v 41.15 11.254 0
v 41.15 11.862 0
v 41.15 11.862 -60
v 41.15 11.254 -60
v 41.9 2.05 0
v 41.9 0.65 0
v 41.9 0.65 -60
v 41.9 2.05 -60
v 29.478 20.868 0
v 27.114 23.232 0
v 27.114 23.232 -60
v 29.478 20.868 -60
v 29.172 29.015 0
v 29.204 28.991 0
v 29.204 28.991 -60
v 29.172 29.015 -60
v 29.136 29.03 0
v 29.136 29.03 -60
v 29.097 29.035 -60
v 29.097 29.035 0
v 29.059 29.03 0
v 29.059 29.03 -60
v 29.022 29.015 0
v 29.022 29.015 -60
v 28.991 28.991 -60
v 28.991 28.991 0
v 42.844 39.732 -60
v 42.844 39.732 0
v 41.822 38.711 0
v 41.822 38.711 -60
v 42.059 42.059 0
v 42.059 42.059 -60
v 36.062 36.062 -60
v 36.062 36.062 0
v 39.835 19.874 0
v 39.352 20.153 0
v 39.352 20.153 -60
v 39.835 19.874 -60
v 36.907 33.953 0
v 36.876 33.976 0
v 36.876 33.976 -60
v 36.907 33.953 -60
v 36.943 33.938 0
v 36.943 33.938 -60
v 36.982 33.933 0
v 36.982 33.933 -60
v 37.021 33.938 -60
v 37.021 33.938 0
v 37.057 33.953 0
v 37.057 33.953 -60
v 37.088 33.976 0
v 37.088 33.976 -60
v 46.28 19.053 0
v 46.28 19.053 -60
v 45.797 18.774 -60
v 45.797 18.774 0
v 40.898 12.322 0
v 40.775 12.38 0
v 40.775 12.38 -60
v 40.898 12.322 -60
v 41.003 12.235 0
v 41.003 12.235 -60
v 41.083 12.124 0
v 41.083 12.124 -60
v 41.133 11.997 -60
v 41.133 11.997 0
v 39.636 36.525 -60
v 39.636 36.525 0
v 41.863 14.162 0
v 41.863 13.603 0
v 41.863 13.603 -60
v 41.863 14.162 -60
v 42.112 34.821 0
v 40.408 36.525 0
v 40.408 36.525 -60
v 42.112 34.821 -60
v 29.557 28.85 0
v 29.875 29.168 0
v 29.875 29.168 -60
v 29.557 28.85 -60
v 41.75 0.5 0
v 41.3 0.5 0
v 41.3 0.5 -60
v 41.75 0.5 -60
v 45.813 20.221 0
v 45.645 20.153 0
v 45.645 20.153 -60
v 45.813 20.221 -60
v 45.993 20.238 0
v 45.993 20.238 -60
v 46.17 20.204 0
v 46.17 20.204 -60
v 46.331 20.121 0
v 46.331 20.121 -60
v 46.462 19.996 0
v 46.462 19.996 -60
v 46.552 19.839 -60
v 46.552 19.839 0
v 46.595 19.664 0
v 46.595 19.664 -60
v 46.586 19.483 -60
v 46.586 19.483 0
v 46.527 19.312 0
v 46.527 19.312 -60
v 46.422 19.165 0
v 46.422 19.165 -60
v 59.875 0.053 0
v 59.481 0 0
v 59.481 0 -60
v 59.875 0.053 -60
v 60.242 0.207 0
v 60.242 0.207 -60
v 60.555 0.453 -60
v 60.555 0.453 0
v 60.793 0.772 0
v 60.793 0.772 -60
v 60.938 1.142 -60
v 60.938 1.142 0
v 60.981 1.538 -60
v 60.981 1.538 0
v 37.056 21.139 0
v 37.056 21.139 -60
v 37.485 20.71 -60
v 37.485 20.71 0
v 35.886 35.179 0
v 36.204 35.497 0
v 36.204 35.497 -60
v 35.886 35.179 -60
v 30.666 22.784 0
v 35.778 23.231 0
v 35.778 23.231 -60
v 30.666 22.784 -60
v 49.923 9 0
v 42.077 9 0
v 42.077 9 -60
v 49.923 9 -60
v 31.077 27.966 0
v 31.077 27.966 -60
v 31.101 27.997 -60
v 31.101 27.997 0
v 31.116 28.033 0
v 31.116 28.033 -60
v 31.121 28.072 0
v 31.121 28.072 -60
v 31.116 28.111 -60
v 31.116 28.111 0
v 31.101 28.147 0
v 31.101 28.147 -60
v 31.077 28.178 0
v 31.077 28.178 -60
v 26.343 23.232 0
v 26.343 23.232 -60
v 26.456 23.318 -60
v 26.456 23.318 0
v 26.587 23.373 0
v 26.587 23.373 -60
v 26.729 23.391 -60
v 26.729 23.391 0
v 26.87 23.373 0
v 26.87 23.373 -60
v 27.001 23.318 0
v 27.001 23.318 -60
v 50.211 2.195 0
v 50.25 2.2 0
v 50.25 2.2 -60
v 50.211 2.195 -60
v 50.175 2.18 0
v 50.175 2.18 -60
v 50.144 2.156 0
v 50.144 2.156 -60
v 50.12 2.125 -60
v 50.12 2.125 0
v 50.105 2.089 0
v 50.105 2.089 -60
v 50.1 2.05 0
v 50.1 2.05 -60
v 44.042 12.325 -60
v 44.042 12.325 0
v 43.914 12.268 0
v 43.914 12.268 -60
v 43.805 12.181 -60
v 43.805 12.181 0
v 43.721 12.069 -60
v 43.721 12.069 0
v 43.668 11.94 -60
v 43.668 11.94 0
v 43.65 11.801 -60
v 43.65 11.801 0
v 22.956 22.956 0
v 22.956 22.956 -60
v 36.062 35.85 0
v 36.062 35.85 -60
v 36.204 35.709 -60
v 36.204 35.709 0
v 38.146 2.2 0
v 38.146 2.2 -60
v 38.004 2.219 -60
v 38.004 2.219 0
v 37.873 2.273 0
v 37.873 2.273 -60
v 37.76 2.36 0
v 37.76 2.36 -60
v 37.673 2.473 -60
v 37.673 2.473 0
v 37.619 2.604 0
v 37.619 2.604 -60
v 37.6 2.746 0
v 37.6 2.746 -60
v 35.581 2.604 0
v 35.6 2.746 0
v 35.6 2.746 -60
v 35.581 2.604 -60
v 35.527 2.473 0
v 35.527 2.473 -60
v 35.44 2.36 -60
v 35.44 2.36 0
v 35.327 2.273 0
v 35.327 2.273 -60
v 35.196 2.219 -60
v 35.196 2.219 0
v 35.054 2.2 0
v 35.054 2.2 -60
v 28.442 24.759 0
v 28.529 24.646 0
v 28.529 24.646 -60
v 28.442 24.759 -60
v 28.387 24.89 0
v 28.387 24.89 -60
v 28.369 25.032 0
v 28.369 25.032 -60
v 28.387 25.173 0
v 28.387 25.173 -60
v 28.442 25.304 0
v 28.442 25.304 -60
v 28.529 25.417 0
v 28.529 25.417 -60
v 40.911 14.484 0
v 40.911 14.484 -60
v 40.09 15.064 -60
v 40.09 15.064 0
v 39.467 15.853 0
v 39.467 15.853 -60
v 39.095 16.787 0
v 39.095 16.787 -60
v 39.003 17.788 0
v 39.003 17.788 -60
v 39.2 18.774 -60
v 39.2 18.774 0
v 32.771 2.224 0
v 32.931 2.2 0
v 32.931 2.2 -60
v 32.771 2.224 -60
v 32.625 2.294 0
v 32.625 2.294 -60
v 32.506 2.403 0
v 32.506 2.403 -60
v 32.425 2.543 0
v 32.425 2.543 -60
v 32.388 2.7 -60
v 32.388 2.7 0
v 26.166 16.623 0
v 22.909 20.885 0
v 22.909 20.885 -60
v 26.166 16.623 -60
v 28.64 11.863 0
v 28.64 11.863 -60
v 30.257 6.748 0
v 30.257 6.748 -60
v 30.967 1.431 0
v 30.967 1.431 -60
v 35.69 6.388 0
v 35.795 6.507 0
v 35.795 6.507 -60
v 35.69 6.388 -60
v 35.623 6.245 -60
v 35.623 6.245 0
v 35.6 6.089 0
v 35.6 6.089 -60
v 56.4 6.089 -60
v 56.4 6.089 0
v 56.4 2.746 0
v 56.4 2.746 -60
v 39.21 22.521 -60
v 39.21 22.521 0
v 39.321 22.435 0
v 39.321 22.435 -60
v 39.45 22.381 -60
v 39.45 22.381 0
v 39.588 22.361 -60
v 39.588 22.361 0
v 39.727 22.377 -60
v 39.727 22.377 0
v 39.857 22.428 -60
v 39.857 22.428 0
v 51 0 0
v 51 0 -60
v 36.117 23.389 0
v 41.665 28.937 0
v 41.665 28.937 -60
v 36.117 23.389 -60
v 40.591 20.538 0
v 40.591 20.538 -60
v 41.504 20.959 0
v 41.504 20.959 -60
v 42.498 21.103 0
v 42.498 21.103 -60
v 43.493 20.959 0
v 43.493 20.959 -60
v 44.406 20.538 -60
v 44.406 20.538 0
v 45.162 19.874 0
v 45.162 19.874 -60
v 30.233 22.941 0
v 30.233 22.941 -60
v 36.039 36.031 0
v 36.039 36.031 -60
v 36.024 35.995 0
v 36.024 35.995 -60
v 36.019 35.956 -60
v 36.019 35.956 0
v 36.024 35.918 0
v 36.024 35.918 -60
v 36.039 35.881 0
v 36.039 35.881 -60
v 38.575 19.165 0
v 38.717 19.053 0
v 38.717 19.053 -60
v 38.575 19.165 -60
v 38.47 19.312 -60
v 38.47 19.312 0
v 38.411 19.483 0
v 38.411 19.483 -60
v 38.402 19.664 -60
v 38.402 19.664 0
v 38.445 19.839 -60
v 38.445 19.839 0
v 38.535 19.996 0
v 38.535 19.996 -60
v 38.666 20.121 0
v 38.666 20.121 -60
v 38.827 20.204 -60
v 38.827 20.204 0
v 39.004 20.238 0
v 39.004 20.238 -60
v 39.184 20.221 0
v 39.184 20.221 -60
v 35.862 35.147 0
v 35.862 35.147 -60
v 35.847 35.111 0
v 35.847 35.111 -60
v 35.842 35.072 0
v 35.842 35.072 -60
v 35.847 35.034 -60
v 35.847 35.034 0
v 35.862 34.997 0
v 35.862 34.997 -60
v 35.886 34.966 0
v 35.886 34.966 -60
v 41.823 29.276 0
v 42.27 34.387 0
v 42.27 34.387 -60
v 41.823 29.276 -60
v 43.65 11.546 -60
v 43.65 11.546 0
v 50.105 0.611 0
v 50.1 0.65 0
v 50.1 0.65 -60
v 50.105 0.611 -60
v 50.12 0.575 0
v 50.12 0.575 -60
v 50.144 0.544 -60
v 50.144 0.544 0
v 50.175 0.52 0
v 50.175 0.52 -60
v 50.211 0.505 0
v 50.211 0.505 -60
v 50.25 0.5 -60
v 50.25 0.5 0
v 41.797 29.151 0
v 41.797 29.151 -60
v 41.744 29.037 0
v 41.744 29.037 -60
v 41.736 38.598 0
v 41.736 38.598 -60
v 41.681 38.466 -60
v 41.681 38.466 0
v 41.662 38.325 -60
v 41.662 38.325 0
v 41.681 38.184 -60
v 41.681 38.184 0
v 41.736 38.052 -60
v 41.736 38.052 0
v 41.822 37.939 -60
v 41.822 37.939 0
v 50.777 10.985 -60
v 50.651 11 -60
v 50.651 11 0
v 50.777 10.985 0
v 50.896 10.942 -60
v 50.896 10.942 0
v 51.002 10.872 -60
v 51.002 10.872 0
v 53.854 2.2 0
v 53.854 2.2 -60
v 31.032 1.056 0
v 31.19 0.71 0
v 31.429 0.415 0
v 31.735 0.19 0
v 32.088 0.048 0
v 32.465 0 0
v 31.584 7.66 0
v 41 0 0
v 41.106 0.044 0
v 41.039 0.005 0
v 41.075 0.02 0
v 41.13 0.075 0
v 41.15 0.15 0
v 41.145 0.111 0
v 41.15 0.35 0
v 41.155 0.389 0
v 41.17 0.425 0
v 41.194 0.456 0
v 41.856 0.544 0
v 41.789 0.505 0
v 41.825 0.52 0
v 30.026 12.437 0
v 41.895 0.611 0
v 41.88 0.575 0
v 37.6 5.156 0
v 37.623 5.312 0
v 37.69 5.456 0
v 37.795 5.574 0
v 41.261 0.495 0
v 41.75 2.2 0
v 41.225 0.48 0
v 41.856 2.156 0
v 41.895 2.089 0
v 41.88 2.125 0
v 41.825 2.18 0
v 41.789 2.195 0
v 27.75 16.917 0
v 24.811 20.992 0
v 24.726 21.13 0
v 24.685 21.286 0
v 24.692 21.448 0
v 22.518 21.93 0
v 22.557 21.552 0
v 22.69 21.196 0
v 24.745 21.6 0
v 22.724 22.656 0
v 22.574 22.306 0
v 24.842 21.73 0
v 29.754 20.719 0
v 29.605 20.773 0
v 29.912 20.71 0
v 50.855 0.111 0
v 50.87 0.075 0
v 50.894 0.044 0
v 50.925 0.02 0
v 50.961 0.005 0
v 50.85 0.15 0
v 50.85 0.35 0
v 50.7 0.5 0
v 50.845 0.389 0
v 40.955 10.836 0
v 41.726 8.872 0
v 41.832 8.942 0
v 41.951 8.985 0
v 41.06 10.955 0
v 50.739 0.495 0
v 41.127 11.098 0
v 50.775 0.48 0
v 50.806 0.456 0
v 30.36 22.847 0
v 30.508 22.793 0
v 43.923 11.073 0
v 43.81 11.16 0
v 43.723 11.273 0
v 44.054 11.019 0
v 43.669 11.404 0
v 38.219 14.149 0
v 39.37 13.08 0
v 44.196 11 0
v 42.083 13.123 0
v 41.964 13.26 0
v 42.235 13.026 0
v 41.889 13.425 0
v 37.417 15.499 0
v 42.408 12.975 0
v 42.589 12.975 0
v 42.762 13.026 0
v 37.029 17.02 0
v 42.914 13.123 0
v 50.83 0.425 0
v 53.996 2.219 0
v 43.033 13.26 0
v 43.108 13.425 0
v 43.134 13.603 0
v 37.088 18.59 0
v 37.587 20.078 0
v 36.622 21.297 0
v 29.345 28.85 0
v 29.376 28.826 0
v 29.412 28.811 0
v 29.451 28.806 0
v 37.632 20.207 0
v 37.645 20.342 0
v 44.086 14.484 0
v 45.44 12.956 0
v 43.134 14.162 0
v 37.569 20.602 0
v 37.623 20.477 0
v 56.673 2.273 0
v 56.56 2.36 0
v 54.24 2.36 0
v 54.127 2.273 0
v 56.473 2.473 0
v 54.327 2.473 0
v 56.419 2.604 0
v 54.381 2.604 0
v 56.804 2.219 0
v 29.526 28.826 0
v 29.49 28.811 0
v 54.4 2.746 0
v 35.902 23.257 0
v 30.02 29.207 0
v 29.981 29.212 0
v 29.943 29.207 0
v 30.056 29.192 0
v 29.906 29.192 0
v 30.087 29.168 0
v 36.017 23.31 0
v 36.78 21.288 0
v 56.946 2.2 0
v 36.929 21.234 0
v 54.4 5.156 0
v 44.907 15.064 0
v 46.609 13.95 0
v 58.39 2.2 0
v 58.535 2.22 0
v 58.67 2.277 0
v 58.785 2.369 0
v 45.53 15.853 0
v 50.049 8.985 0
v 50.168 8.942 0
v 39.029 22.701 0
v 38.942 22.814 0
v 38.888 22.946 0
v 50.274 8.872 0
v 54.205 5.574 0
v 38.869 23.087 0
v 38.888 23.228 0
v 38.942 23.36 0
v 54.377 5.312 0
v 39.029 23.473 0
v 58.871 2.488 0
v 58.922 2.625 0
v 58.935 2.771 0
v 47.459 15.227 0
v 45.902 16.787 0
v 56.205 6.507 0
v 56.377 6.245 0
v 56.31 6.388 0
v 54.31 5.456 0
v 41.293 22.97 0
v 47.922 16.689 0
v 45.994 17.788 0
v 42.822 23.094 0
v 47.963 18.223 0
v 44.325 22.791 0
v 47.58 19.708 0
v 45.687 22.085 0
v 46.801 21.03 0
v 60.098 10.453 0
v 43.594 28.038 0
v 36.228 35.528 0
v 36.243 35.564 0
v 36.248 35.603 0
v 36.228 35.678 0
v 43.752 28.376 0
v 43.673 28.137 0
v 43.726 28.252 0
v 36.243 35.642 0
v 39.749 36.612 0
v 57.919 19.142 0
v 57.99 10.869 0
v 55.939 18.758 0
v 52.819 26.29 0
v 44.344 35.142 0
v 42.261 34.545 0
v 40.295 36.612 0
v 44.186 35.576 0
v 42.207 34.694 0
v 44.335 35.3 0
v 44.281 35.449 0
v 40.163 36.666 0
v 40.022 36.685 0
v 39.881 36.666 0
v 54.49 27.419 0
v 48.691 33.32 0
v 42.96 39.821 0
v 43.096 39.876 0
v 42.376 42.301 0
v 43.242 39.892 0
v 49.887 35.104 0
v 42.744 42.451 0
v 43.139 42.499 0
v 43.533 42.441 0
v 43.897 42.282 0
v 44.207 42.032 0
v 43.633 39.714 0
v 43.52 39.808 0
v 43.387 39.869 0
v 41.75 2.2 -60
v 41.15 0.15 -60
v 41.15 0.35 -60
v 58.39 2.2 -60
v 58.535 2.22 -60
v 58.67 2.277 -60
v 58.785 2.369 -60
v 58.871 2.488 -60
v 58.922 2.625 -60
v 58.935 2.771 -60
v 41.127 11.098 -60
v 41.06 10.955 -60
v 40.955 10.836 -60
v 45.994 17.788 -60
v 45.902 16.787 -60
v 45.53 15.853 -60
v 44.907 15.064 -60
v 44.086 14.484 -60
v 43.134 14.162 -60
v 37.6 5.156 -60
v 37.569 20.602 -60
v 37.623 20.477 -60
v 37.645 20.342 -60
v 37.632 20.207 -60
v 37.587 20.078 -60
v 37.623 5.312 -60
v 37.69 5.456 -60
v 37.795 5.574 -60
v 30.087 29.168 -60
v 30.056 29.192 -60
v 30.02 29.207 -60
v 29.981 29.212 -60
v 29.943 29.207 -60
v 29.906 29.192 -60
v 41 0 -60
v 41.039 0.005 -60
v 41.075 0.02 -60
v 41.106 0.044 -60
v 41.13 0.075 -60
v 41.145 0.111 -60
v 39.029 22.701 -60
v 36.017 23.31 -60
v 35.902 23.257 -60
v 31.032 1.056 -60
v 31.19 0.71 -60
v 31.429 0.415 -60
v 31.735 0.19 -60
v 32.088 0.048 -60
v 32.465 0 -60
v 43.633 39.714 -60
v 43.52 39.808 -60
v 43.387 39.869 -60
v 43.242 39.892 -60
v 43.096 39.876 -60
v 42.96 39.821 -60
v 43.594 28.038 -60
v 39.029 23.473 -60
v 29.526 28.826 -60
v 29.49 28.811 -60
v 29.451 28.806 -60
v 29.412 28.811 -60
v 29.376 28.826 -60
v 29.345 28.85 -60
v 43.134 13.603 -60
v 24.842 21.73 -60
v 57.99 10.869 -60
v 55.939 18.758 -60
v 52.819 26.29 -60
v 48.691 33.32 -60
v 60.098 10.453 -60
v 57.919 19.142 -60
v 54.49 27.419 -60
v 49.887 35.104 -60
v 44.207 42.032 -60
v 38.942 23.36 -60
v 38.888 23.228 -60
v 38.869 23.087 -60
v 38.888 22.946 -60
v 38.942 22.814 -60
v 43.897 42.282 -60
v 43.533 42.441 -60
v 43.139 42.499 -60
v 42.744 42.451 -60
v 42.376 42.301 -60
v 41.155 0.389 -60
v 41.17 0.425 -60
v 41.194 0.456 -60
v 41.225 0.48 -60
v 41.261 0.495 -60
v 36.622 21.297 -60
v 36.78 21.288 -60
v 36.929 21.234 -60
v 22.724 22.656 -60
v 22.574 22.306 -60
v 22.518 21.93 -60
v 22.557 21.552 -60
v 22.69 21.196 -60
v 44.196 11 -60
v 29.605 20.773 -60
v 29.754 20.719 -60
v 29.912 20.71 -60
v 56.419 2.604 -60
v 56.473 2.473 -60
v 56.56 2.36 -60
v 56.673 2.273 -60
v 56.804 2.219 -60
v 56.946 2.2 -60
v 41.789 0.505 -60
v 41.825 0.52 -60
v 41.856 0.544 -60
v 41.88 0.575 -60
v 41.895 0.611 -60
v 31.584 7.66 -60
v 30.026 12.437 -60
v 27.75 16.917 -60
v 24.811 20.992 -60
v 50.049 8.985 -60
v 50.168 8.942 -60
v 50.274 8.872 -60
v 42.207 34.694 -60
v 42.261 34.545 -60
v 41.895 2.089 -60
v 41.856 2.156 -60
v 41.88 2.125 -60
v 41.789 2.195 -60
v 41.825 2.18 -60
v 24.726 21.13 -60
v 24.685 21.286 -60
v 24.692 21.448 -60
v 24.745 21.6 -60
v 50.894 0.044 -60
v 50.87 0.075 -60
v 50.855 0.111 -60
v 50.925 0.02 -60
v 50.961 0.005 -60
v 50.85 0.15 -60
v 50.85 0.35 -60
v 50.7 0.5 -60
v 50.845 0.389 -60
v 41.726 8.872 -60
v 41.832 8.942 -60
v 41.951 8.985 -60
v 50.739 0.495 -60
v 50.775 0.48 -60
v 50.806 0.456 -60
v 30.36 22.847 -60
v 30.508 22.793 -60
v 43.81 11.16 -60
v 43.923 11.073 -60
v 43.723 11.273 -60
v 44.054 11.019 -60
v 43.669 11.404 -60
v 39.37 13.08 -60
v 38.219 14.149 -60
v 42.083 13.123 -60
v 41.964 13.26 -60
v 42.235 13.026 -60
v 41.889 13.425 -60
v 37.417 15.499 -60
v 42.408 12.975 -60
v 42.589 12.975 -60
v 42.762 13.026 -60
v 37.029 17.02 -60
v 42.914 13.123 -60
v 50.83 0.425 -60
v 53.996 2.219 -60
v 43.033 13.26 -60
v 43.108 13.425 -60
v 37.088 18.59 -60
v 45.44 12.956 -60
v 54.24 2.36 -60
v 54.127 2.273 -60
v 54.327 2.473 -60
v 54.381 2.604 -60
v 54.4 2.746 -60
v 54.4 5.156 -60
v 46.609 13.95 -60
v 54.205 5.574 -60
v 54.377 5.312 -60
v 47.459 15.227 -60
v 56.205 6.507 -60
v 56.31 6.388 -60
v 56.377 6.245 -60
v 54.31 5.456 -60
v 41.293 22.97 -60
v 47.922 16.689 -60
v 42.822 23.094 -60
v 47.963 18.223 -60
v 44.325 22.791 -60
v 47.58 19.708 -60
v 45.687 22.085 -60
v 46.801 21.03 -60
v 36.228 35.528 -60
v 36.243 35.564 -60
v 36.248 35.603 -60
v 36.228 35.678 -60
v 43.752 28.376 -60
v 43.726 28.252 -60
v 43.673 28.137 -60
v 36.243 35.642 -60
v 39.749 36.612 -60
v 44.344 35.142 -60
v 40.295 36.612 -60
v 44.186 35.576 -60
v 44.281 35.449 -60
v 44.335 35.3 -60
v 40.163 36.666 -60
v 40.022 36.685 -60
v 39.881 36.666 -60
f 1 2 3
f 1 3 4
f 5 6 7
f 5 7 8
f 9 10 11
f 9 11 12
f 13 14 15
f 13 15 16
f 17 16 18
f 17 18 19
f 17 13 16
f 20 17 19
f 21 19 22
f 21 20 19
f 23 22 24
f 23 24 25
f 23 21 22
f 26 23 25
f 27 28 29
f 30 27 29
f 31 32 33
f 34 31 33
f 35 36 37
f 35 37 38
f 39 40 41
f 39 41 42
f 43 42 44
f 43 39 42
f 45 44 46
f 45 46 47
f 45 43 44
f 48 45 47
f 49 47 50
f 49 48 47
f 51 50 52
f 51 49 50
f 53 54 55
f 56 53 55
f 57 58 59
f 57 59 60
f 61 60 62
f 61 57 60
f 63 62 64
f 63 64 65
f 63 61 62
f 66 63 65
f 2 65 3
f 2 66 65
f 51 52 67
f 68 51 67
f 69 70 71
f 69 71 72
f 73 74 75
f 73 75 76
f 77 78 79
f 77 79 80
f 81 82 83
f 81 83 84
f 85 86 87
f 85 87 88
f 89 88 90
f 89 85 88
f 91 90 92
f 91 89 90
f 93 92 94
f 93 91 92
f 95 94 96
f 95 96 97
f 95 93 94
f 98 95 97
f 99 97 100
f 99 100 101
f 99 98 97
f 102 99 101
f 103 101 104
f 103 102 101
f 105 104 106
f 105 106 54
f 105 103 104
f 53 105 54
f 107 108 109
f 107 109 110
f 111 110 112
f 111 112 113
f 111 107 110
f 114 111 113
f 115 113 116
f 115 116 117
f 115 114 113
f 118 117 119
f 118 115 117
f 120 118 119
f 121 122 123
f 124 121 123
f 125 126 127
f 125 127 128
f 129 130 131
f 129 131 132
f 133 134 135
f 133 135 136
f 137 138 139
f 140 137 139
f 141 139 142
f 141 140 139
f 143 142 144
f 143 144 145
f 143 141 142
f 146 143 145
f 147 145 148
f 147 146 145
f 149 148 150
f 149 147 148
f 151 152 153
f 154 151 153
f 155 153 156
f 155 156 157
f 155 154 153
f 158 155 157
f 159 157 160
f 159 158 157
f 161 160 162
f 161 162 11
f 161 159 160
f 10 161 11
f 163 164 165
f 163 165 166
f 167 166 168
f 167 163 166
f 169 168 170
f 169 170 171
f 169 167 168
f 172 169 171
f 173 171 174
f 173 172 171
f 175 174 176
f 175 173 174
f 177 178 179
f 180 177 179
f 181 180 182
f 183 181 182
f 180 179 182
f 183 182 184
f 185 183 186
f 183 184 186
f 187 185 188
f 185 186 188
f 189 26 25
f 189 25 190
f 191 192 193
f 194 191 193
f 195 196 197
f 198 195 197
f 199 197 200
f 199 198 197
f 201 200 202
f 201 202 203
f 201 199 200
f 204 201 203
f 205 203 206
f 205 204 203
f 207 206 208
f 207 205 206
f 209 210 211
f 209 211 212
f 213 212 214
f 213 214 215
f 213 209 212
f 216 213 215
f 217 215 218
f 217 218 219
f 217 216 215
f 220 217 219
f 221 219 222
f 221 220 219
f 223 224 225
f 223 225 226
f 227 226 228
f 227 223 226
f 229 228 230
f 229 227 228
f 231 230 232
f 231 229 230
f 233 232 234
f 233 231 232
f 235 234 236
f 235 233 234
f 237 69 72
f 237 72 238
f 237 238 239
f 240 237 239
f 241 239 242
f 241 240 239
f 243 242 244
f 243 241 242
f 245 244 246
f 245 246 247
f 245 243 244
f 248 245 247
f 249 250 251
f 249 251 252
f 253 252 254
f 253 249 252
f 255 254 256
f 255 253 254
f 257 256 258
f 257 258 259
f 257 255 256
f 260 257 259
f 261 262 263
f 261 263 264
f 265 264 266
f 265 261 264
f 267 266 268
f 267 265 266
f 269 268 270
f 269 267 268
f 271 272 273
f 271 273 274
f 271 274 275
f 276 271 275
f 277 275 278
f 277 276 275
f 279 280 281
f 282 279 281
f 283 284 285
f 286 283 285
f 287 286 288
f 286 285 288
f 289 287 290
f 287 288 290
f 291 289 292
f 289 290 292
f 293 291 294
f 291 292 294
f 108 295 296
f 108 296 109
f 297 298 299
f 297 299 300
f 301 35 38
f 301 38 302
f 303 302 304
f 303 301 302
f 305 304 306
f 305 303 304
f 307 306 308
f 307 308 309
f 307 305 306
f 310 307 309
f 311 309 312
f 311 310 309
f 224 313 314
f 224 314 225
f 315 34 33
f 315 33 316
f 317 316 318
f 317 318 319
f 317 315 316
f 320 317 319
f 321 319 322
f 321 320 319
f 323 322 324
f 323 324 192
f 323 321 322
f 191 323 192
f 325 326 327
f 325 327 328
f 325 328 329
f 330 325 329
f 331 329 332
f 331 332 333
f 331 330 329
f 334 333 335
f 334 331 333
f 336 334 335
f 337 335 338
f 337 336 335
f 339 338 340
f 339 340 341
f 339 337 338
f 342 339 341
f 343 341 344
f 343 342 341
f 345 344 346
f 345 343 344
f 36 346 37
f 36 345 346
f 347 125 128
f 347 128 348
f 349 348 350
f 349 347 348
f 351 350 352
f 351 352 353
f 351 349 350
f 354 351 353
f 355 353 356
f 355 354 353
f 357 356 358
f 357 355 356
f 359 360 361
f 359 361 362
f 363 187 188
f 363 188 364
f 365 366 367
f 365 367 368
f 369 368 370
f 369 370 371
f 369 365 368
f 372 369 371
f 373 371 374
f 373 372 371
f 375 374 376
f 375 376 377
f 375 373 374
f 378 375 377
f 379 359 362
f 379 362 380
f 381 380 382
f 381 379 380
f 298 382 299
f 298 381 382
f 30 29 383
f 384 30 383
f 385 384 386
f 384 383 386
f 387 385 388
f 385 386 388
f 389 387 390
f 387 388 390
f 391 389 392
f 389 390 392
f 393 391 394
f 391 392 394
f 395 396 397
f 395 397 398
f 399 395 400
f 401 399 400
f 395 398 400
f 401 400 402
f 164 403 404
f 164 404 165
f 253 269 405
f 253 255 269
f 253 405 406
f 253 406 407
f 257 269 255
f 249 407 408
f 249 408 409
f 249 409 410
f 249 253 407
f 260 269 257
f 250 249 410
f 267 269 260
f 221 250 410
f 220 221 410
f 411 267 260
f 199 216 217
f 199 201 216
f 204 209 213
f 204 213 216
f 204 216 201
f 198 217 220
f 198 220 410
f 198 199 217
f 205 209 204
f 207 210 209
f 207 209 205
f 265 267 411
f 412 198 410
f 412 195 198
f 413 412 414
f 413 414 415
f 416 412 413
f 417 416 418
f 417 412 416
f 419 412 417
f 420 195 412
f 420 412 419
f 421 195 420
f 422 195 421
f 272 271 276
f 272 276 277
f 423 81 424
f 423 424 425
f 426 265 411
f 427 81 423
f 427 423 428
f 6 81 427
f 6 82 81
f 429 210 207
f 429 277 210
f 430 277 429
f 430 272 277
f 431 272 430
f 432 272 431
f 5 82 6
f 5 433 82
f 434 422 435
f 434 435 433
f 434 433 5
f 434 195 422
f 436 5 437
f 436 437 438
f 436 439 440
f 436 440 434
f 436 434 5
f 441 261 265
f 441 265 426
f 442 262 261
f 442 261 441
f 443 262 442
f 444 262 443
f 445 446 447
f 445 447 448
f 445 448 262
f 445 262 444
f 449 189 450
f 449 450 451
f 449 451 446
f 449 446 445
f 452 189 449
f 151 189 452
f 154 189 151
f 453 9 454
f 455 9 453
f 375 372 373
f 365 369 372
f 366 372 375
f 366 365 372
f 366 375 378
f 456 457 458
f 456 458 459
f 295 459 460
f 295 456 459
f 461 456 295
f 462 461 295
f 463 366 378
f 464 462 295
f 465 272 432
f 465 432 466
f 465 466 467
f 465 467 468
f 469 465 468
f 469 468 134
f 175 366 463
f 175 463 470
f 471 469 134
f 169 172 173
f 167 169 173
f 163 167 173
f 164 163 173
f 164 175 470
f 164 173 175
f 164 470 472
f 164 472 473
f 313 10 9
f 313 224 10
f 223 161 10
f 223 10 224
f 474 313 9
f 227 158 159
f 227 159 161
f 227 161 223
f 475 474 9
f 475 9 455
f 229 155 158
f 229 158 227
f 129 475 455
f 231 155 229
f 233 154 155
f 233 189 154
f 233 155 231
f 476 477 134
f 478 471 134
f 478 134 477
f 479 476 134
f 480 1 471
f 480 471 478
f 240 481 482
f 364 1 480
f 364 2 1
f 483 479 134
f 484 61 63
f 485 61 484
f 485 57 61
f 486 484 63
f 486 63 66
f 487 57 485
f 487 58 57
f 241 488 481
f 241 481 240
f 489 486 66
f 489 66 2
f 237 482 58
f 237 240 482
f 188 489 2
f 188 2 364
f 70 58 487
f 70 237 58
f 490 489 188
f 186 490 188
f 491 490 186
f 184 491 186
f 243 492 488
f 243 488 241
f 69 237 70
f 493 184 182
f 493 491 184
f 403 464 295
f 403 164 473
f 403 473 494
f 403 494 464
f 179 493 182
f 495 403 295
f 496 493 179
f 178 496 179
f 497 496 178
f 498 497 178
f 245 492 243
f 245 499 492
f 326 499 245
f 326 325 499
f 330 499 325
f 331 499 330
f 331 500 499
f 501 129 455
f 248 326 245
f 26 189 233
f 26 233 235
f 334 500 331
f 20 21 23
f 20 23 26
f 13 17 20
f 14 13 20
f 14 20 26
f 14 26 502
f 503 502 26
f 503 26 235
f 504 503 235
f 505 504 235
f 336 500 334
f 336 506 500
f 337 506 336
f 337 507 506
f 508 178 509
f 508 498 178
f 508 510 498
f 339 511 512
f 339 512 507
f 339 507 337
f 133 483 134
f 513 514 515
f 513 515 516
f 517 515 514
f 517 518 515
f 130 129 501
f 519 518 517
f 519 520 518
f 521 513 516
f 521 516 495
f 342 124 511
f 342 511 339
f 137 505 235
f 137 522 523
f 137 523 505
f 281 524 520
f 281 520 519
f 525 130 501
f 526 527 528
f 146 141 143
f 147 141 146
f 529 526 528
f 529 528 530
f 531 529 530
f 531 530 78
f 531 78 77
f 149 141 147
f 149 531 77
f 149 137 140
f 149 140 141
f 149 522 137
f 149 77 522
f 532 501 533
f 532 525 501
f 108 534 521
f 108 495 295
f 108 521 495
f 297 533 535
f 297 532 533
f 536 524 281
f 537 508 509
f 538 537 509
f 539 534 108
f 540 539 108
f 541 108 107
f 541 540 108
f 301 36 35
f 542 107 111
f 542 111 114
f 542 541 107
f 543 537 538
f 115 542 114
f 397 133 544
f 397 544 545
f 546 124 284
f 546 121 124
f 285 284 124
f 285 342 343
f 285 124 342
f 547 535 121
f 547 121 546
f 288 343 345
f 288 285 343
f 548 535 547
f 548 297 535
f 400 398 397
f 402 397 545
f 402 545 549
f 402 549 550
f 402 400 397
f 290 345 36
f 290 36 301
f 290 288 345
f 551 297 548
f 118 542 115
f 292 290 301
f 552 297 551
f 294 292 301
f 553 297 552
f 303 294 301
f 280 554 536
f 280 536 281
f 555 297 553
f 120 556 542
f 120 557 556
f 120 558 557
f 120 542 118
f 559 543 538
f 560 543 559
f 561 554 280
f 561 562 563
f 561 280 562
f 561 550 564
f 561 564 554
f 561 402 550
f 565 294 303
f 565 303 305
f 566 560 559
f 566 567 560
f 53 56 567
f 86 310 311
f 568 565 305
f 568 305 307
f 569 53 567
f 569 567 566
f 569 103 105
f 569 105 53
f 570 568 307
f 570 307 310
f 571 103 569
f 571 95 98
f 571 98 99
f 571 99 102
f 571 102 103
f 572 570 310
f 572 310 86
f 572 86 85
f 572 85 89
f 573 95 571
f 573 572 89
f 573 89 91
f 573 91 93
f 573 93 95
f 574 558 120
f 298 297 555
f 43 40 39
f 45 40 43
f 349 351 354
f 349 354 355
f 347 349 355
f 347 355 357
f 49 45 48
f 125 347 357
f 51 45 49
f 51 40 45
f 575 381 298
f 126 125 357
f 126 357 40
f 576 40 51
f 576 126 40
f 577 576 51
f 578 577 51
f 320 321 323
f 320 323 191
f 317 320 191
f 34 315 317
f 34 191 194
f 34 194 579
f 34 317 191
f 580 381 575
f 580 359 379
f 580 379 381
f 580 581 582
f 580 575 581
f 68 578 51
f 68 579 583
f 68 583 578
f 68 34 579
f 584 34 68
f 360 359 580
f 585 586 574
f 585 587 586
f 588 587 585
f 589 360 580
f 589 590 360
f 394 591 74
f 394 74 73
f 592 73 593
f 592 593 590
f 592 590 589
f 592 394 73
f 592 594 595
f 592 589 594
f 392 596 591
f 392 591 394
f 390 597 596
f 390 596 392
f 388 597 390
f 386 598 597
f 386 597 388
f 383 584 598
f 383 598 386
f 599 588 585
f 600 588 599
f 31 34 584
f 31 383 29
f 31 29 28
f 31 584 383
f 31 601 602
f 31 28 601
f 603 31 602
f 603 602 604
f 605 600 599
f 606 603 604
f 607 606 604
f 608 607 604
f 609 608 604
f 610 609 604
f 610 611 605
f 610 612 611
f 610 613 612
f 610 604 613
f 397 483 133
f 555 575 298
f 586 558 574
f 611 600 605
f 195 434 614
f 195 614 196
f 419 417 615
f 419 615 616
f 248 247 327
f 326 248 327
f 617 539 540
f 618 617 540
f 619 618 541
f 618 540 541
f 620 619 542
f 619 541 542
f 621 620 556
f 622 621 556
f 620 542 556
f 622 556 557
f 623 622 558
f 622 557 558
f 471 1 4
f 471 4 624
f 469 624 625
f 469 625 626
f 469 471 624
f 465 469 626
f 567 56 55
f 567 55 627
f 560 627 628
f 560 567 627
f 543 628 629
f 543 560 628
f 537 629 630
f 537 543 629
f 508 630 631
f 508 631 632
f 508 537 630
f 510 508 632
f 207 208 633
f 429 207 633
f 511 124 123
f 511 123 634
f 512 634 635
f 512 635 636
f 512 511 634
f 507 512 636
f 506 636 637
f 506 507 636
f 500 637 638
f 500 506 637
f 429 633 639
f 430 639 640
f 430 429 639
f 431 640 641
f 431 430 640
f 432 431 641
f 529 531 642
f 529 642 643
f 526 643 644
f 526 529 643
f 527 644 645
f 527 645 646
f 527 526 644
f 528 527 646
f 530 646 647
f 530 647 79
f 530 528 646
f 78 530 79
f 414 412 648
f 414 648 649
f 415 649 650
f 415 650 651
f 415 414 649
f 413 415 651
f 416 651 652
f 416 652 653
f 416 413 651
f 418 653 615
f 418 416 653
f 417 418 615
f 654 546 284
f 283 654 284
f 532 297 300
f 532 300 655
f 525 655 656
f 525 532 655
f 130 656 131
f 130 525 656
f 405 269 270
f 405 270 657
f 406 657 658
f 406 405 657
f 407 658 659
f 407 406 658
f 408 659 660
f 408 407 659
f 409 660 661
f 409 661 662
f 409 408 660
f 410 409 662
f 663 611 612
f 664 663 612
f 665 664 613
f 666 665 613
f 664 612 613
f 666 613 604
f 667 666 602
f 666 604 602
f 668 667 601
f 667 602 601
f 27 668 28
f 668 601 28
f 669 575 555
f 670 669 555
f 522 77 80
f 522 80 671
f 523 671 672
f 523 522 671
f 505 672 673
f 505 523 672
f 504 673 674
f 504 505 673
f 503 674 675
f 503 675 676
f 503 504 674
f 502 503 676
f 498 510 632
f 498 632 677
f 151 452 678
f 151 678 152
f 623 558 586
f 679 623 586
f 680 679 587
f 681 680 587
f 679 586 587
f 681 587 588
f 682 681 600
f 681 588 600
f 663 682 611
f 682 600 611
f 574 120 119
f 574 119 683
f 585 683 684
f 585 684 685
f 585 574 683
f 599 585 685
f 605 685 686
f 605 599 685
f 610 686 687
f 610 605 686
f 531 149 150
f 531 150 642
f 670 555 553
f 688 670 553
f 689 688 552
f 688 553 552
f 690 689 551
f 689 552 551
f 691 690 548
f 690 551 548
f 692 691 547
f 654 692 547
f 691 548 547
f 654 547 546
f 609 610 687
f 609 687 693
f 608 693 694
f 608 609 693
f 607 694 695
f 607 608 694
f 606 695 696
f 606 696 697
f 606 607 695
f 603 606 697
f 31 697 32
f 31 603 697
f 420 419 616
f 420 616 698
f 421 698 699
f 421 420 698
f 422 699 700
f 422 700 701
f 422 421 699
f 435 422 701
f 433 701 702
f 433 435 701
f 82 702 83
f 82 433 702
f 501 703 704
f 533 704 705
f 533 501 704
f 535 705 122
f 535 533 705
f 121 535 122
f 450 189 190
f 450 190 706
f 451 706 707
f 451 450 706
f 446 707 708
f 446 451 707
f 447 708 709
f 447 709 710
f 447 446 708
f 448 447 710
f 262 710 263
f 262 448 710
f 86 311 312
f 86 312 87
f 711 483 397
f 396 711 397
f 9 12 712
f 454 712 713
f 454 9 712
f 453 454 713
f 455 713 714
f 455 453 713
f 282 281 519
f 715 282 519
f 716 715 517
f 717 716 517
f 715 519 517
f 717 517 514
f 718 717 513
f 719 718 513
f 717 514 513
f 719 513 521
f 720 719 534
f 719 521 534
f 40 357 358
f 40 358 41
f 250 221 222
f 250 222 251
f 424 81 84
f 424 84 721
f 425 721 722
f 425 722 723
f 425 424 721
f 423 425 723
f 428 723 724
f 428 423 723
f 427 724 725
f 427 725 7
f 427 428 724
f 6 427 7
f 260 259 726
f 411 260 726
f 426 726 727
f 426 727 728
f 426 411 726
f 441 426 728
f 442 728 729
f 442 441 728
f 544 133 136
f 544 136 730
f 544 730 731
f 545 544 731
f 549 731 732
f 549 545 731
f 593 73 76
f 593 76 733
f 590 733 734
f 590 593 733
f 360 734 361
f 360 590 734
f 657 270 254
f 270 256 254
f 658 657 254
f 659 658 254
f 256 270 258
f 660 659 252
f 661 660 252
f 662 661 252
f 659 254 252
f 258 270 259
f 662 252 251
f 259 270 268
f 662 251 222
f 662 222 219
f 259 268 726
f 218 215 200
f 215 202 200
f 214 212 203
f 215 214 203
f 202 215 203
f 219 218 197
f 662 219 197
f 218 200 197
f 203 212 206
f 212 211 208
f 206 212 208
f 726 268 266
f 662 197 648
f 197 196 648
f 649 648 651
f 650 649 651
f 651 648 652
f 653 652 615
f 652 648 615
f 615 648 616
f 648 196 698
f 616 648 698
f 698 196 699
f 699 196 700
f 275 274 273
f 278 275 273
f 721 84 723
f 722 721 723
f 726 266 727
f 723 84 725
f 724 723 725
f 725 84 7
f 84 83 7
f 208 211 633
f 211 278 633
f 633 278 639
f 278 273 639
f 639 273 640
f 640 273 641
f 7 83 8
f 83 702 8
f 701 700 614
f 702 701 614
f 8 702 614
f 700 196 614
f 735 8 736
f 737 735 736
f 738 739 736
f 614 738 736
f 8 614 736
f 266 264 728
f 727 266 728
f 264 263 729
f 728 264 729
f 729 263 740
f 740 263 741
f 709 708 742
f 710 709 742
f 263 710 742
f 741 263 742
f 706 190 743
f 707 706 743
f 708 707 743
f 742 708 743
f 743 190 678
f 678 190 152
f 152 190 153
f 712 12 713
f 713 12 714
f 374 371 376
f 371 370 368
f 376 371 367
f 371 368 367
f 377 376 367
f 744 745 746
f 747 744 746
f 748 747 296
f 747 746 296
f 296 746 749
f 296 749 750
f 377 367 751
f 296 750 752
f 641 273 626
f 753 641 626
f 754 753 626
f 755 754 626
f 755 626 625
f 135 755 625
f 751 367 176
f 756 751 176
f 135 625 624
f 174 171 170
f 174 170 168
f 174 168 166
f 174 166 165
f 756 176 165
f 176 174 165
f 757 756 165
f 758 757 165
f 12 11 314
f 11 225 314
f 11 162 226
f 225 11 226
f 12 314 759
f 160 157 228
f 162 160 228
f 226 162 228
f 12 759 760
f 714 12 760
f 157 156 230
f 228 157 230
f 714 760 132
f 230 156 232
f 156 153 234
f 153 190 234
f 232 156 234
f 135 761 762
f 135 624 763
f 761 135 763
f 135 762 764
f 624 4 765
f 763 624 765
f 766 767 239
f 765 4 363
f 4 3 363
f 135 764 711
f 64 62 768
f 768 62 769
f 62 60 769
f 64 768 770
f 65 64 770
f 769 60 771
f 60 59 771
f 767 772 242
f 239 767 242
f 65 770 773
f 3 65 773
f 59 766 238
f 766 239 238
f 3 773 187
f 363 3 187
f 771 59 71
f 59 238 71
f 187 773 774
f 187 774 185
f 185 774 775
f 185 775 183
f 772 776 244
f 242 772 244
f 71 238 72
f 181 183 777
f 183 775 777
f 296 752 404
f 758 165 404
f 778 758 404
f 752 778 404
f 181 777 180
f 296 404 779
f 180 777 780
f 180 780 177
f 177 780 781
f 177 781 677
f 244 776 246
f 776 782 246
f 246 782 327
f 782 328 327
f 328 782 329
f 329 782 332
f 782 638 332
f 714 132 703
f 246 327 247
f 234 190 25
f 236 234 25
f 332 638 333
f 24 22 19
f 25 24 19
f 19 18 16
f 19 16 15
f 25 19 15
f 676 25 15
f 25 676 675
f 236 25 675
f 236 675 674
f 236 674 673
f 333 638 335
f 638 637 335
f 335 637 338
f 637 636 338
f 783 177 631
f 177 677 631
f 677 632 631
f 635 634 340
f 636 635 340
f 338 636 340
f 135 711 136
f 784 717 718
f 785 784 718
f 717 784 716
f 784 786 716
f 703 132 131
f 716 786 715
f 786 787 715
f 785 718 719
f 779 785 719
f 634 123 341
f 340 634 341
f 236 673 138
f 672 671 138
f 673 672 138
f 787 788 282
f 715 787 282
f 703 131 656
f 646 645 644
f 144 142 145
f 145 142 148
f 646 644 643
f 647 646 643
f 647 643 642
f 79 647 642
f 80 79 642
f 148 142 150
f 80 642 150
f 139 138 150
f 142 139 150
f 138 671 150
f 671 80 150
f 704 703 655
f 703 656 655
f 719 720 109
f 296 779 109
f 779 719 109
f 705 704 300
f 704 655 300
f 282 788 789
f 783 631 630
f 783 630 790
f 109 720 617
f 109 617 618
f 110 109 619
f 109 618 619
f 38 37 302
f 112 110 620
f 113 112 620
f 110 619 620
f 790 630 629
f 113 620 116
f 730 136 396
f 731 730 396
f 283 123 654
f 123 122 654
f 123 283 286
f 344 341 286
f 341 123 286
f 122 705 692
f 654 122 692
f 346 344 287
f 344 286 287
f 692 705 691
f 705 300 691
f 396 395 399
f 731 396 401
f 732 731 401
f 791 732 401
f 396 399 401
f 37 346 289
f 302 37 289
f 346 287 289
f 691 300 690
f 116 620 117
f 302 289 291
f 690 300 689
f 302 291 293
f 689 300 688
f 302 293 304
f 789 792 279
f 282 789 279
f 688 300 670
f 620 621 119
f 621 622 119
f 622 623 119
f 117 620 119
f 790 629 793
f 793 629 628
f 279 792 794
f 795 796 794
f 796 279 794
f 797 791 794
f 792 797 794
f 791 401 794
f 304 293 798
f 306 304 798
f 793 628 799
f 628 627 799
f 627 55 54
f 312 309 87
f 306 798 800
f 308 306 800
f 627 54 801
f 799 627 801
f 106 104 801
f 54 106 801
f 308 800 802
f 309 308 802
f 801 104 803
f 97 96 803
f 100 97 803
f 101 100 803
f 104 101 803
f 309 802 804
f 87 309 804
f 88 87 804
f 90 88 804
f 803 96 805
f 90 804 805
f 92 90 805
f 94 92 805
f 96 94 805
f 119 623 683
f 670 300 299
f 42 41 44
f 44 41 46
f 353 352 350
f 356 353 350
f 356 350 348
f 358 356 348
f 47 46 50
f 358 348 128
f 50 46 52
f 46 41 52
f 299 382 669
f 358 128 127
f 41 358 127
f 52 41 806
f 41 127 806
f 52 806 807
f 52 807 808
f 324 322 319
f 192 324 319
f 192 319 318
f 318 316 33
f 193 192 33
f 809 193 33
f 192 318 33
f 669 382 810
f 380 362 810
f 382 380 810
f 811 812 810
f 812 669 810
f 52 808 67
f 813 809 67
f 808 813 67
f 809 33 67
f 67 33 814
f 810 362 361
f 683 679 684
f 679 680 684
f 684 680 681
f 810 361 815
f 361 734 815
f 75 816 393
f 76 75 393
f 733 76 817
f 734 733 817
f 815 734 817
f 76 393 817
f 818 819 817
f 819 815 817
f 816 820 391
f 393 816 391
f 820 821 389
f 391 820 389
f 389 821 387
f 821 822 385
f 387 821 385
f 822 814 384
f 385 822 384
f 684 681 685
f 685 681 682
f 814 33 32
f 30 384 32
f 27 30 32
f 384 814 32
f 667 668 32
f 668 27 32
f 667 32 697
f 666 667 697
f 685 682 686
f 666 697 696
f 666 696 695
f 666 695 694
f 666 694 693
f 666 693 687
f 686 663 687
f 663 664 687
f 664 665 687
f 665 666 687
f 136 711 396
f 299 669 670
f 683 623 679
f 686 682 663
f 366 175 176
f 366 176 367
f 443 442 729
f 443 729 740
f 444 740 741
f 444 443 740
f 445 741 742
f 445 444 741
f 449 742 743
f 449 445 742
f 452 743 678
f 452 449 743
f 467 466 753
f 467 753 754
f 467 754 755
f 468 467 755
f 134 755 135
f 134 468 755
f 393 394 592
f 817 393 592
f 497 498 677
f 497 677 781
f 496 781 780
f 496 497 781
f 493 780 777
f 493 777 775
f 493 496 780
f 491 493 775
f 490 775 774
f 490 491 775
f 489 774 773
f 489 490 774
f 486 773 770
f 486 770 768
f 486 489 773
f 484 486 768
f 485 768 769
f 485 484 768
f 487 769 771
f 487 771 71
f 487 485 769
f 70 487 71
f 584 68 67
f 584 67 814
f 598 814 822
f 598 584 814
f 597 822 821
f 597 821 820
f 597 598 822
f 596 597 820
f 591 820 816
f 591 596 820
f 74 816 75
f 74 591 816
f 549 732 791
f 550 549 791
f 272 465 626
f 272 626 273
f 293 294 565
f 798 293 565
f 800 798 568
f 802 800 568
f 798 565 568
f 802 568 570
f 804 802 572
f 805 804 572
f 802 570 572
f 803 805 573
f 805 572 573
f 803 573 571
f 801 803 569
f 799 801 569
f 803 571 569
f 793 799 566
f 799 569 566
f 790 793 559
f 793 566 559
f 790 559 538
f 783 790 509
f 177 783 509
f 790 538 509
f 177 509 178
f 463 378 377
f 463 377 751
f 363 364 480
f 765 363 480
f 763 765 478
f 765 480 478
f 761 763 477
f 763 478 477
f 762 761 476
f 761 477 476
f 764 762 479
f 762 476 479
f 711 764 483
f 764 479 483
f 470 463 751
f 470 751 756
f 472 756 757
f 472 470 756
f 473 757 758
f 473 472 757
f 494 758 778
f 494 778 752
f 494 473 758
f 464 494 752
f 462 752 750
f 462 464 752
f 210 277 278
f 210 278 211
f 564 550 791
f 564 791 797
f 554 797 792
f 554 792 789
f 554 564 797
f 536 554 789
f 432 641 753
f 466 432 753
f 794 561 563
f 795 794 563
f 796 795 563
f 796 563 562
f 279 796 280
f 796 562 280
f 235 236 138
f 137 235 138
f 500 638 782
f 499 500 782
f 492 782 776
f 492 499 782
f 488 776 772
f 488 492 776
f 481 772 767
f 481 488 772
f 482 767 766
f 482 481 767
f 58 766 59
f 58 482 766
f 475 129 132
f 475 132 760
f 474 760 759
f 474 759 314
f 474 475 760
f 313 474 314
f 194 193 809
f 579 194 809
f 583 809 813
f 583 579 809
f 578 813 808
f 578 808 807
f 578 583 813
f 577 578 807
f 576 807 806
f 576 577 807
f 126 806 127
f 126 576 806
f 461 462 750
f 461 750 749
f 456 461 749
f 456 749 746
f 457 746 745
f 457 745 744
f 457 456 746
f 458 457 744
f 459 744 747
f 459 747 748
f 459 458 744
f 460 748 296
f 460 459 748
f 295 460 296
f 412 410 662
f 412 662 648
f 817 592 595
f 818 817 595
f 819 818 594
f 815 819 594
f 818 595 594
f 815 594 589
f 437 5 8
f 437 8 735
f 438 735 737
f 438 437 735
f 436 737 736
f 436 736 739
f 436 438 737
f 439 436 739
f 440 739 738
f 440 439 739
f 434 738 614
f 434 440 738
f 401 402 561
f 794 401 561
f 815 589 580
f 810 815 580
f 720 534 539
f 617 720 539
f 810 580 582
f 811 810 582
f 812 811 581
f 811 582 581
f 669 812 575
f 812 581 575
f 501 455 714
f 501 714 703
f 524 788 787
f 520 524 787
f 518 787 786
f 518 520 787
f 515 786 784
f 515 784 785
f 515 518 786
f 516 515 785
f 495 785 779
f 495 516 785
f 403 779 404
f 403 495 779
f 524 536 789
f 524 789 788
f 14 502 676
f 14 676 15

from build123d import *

# Parameters (mm, degrees)
Y_KSEKLIK_EKSTR_ZYON1_DEPTH = 60


with BuildPart() as part:
    # Çizim3 → Yükseklik-Ekstrüzyon1 (new body)
    with BuildSketch(Plane.XY):
        with BuildLine():
            Line((51, 0), (59.481089432, 0))
            ThreePointArc((59.481089432, 0), (60.555036053, 0.452794836), (60.980612695, 1.537815126))
            ThreePointArc((60.980612695, 1.537815126), (56.356651483, 23.343689374), (44.207204261, 42.032405254))
            ThreePointArc((44.207204261, 42.032405254), (43.139050927, 42.498702329), (42.05948169, 42.05948169))
            Line((42.05948169, 42.05948169), (36.062445841, 36.062445841))
            ThreePointArc((36.062445841, 36.062445841), (36.018511858, 35.956379823), (36.062445841, 35.850313806))
            Line((36.062445841, 35.850313806), (36.203867197, 35.70889245))
            ThreePointArc((36.203867197, 35.70889245), (36.24780118, 35.602826433), (36.203867197, 35.496760416))
            Line((36.203867197, 35.496760416), (35.885669145, 35.178562364))
            ThreePointArc((35.885669145, 35.178562364), (35.841735162, 35.072496347), (35.885669145, 34.96643033))
            Line((35.885669145, 34.96643033), (36.875618639, 33.976480836))
            ThreePointArc((36.875618639, 33.976480836), (36.981684656, 33.932546853), (37.087750673, 33.976480836))
            Line((37.087750673, 33.976480836), (39.636467242, 36.525197405))
            ThreePointArc((39.636467242, 36.525197405), (40.022243815, 36.684991294), (40.408020388, 36.525197405))
            Line((40.408020388, 36.525197405), (42.112435937, 34.820781856))
            ThreePointArc((42.112435937, 34.820781856), (42.239327901, 34.621601371), (42.270153765, 34.387455685))
            Line((42.270153765, 34.387455685), (41.822915851, 29.275502936))
            ThreePointArc((41.822915851, 29.275502936), (41.773876207, 29.092484494), (41.665198023, 28.937275961))
            Line((41.665198023, 28.937275961), (36.116547908, 23.388625846))
            ThreePointArc((36.116547908, 23.388625846), (35.961339375, 23.279947662), (35.778320934, 23.230908018))
            Line((35.778320934, 23.230908018), (30.666368185, 22.783670104))
            ThreePointArc((30.666368185, 22.783670104), (30.432222498, 22.814495969), (30.233042013, 22.941387932))
            Line((30.233042013, 22.941387932), (28.528626464, 24.645803481))
            ThreePointArc((28.528626464, 24.645803481), (28.368832576, 25.031580054), (28.528626464, 25.417356627))
            Line((28.528626464, 25.417356627), (31.077343033, 27.966073196))
            ThreePointArc((31.077343033, 27.966073196), (31.121277016, 28.072139213), (31.077343033, 28.17820523))
            Line((31.077343033, 28.17820523), (30.087393539, 29.168154724))
            ThreePointArc((30.087393539, 29.168154724), (29.981327522, 29.212088707), (29.875261505, 29.168154724))
            Line((29.875261505, 29.168154724), (29.557063454, 28.849956672))
            ThreePointArc((29.557063454, 28.849956672), (29.450997436, 28.80602269), (29.344931419, 28.849956672))
            Line((29.344931419, 28.849956672), (29.203510063, 28.991378029))
            ThreePointArc((29.203510063, 28.991378029), (29.097444046, 29.035312011), (28.991378029, 28.991378029))
            Line((28.991378029, 28.991378029), (22.956480566, 22.956480566))
            ThreePointArc((22.956480566, 22.956480566), (22.517540413, 21.930445005), (22.90865732, 20.885244069))
            ThreePointArc((22.90865732, 20.885244069), (28.640265508, 11.863186403), (30.966964646, 1.430769231))
            ThreePointArc((30.966964646, 1.430769231), (31.429471899, 0.415139144), (32.465366161, 0))
            Line((32.465366161, 0), (41, 0))
            ThreePointArc((41, 0), (41.106066017, 0.043933983), (41.15, 0.15))
            Line((41.15, 0.15), (41.15, 0.35))
            ThreePointArc((41.15, 0.35), (41.193933983, 0.456066017), (41.3, 0.5))
            Line((41.3, 0.5), (41.75, 0.5))
            ThreePointArc((41.75, 0.5), (41.856066017, 0.543933983), (41.9, 0.65))
            Line((41.9, 0.65), (41.9, 2.05))
            ThreePointArc((41.9, 2.05), (41.856066017, 2.156066017), (41.75, 2.2))
            Line((41.75, 2.2), (38.145570461, 2.2))
            ThreePointArc((38.145570461, 2.2), (37.759793889, 2.359793889), (37.6, 2.745570461))
            Line((37.6, 2.745570461), (37.6, 5.155978046))
            ThreePointArc((37.6, 5.155978046), (37.651115704, 5.386546086), (37.794884529, 5.573909267))
            Line((37.794884529, 5.573909267), (41.725825944, 8.872360759))
            ThreePointArc((41.725825944, 8.872360759), (41.88991579, 8.967098075), (42.076511877, 9))
            Line((42.076511877, 9), (49.923488123, 9))
            ThreePointArc((49.923488123, 9), (50.11008421, 8.967098075), (50.274174056, 8.872360759))
            Line((50.274174056, 8.872360759), (54.205115471, 5.573909267))
            ThreePointArc((54.205115471, 5.573909267), (54.348884296, 5.386546086), (54.4, 5.155978046))
            Line((54.4, 5.155978046), (54.4, 2.745570461))
            ThreePointArc((54.4, 2.745570461), (54.240206111, 2.359793889), (53.854429539, 2.2))
            Line((53.854429539, 2.2), (50.25, 2.2))
            ThreePointArc((50.25, 2.2), (50.143933983, 2.156066017), (50.1, 2.05))
            Line((50.1, 2.05), (50.1, 0.65))
            ThreePointArc((50.1, 0.65), (50.143933983, 0.543933983), (50.25, 0.5))
            Line((50.25, 0.5), (50.7, 0.5))
            ThreePointArc((50.7, 0.5), (50.806066017, 0.456066017), (50.85, 0.35))
            Line((50.85, 0.35), (50.85, 0.15))
            ThreePointArc((50.85, 0.15), (50.893933983, 0.043933983), (51, 0))
        make_face()
        with BuildLine():
            Line((56.945570461, 2.2), (58.389915016, 2.2))
            ThreePointArc((58.389915016, 2.2), (58.784647482, 2.368962697), (58.934883346, 2.771195588))
            ThreePointArc((58.934883346, 2.771195588), (54.508892418, 22.57832251), (43.632786855, 39.71372447))
            ThreePointArc((43.632786855, 39.71372447), (43.242132452, 39.891913277), (42.843539779, 39.732269942))
            Line((42.843539779, 39.732269942), (41.82223395, 38.710964113))
            ThreePointArc((41.82223395, 38.710964113), (41.662440062, 38.32518754), (41.82223395, 37.939410967))
            Line((41.82223395, 37.939410967), (44.186108114, 35.575536804))
            ThreePointArc((44.186108114, 35.575536804), (44.313000077, 35.376356319), (44.343825942, 35.142210633))
            Line((44.343825942, 35.142210633), (43.751861055, 28.376021015))
            ThreePointArc((43.751861055, 28.376021015), (43.702821411, 28.193002574), (43.594143227, 28.037794041))
            Line((43.594143227, 28.037794041), (39.029162165, 23.472812979))
            ThreePointArc((39.029162165, 23.472812979), (38.869368276, 23.087036406), (39.029162165, 22.701259833))
            Line((39.029162165, 22.701259833), (39.209750843, 22.520671155))
            ThreePointArc((39.209750843, 22.520671155), (39.518169578, 22.366389496), (39.857496647, 22.42788817))
            ThreePointArc((39.857496647, 22.42788817), (47.579795924, 19.708196767), (44.042417973, 12.324594348))
            ThreePointArc((44.042417973, 12.324594348), (43.758991372, 12.128140006), (43.65, 11.800961419))
            Line((43.65, 11.800961419), (43.65, 11.545570461))
            ThreePointArc((43.65, 11.545570461), (43.809793889, 11.159793889), (44.195570461, 11))
            Line((44.195570461, 11), (50.651428591, 11))
            ThreePointArc((50.651428591, 11), (50.838024679, 10.967098075), (51.002114524, 10.872360759))
            Line((51.002114524, 10.872360759), (56.205115471, 6.506524583))
            ThreePointArc((56.205115471, 6.506524583), (56.348884296, 6.319161403), (56.4, 6.088593363))
            Line((56.4, 6.088593363), (56.4, 2.745570461))
            ThreePointArc((56.4, 2.745570461), (56.559793889, 2.359793889), (56.945570461, 2.2))
        make_face(mode=Mode.SUBTRACT)
        with BuildLine():
            Line((35.054429539, 2.2), (32.931315946, 2.2))
            ThreePointArc((32.931315946, 2.2), (32.561912844, 2.344087614), (32.387631786, 2.700242082))
            ThreePointArc((32.387631786, 2.700242082), (30.026084807, 12.437211552), (24.81087355, 20.992154575))
            ThreePointArc((24.81087355, 20.992154575), (24.682269628, 21.367229133), (24.841591738, 21.730321901))
            Line((24.841591738, 21.730321901), (26.342859756, 23.231589919))
            ThreePointArc((26.342859756, 23.231589919), (26.728636329, 23.391383807), (27.114412902, 23.231589919))
            Line((27.114412902, 23.231589919), (29.478287065, 20.867715756))
            ThreePointArc((29.478287065, 20.867715756), (29.67746755, 20.740823792), (29.911613237, 20.709997927))
            Line((29.911613237, 20.709997927), (36.622183037, 21.297096711))
            ThreePointArc((36.622183037, 21.297096711), (36.856328724, 21.266270846), (37.055509209, 21.139378882))
            Line((37.055509209, 21.139378882), (37.485300638, 20.709587454))
            ThreePointArc((37.485300638, 20.709587454), (37.638184329, 20.410368657), (37.586740146, 20.07831624))
            ThreePointArc((37.586740146, 20.07831624), (37.417121067, 15.498679011), (40.775352408, 12.380325272))
            ThreePointArc((40.775352408, 12.380325272), (41.046525454, 12.181905286), (41.15, 11.862220551))
            Line((41.15, 11.862220551), (41.15, 11.254403684))
            ThreePointArc((41.15, 11.254403684), (41.098884296, 11.023835644), (40.955115471, 10.836472464))
            Line((40.955115471, 10.836472464), (35.794884529, 6.506524583))
            ThreePointArc((35.794884529, 6.506524583), (35.651115704, 6.319161403), (35.6, 6.088593363))
            Line((35.6, 6.088593363), (35.6, 2.745570461))
            ThreePointArc((35.6, 2.745570461), (35.440206111, 2.359793889), (35.054429539, 2.2))
        make_face(mode=Mode.SUBTRACT)
        with BuildLine():
            Line((45.161707445, 19.874363918), (45.645032532, 20.153411787))
            ThreePointArc((45.645032532, 20.153411787), (46.512534009, 19.920965467), (46.280087689, 19.05346399))
            Line((46.280087689, 19.05346399), (45.796762602, 18.774416121))
            ThreePointArc((45.796762602, 18.774416121), (45.529547409, 15.853437889), (43.133513652, 14.161533627))
            Line((43.133513652, 14.161533627), (43.133513652, 13.603437889))
            ThreePointArc((43.133513652, 13.603437889), (42.498458496, 12.968382732), (41.863403339, 13.603437889))
            Line((41.863403339, 13.603437889), (41.863403339, 14.161533627))
            ThreePointArc((41.863403339, 14.161533627), (39.467369582, 15.853437889), (39.200154389, 18.774416121))
            Line((39.200154389, 18.774416121), (38.716829302, 19.05346399))
            ThreePointArc((38.716829302, 19.05346399), (38.484382982, 19.920965467), (39.351884459, 20.153411787))
            Line((39.351884459, 20.153411787), (39.835209546, 19.874363918))
            ThreePointArc((39.835209546, 19.874363918), (42.498458496, 21.103437889), (45.161707445, 19.874363918))
        make_face(mode=Mode.SUBTRACT)
    extrude(amount=-Y_KSEKLIK_EKSTR_ZYON1_DEPTH)


solid = part.part
